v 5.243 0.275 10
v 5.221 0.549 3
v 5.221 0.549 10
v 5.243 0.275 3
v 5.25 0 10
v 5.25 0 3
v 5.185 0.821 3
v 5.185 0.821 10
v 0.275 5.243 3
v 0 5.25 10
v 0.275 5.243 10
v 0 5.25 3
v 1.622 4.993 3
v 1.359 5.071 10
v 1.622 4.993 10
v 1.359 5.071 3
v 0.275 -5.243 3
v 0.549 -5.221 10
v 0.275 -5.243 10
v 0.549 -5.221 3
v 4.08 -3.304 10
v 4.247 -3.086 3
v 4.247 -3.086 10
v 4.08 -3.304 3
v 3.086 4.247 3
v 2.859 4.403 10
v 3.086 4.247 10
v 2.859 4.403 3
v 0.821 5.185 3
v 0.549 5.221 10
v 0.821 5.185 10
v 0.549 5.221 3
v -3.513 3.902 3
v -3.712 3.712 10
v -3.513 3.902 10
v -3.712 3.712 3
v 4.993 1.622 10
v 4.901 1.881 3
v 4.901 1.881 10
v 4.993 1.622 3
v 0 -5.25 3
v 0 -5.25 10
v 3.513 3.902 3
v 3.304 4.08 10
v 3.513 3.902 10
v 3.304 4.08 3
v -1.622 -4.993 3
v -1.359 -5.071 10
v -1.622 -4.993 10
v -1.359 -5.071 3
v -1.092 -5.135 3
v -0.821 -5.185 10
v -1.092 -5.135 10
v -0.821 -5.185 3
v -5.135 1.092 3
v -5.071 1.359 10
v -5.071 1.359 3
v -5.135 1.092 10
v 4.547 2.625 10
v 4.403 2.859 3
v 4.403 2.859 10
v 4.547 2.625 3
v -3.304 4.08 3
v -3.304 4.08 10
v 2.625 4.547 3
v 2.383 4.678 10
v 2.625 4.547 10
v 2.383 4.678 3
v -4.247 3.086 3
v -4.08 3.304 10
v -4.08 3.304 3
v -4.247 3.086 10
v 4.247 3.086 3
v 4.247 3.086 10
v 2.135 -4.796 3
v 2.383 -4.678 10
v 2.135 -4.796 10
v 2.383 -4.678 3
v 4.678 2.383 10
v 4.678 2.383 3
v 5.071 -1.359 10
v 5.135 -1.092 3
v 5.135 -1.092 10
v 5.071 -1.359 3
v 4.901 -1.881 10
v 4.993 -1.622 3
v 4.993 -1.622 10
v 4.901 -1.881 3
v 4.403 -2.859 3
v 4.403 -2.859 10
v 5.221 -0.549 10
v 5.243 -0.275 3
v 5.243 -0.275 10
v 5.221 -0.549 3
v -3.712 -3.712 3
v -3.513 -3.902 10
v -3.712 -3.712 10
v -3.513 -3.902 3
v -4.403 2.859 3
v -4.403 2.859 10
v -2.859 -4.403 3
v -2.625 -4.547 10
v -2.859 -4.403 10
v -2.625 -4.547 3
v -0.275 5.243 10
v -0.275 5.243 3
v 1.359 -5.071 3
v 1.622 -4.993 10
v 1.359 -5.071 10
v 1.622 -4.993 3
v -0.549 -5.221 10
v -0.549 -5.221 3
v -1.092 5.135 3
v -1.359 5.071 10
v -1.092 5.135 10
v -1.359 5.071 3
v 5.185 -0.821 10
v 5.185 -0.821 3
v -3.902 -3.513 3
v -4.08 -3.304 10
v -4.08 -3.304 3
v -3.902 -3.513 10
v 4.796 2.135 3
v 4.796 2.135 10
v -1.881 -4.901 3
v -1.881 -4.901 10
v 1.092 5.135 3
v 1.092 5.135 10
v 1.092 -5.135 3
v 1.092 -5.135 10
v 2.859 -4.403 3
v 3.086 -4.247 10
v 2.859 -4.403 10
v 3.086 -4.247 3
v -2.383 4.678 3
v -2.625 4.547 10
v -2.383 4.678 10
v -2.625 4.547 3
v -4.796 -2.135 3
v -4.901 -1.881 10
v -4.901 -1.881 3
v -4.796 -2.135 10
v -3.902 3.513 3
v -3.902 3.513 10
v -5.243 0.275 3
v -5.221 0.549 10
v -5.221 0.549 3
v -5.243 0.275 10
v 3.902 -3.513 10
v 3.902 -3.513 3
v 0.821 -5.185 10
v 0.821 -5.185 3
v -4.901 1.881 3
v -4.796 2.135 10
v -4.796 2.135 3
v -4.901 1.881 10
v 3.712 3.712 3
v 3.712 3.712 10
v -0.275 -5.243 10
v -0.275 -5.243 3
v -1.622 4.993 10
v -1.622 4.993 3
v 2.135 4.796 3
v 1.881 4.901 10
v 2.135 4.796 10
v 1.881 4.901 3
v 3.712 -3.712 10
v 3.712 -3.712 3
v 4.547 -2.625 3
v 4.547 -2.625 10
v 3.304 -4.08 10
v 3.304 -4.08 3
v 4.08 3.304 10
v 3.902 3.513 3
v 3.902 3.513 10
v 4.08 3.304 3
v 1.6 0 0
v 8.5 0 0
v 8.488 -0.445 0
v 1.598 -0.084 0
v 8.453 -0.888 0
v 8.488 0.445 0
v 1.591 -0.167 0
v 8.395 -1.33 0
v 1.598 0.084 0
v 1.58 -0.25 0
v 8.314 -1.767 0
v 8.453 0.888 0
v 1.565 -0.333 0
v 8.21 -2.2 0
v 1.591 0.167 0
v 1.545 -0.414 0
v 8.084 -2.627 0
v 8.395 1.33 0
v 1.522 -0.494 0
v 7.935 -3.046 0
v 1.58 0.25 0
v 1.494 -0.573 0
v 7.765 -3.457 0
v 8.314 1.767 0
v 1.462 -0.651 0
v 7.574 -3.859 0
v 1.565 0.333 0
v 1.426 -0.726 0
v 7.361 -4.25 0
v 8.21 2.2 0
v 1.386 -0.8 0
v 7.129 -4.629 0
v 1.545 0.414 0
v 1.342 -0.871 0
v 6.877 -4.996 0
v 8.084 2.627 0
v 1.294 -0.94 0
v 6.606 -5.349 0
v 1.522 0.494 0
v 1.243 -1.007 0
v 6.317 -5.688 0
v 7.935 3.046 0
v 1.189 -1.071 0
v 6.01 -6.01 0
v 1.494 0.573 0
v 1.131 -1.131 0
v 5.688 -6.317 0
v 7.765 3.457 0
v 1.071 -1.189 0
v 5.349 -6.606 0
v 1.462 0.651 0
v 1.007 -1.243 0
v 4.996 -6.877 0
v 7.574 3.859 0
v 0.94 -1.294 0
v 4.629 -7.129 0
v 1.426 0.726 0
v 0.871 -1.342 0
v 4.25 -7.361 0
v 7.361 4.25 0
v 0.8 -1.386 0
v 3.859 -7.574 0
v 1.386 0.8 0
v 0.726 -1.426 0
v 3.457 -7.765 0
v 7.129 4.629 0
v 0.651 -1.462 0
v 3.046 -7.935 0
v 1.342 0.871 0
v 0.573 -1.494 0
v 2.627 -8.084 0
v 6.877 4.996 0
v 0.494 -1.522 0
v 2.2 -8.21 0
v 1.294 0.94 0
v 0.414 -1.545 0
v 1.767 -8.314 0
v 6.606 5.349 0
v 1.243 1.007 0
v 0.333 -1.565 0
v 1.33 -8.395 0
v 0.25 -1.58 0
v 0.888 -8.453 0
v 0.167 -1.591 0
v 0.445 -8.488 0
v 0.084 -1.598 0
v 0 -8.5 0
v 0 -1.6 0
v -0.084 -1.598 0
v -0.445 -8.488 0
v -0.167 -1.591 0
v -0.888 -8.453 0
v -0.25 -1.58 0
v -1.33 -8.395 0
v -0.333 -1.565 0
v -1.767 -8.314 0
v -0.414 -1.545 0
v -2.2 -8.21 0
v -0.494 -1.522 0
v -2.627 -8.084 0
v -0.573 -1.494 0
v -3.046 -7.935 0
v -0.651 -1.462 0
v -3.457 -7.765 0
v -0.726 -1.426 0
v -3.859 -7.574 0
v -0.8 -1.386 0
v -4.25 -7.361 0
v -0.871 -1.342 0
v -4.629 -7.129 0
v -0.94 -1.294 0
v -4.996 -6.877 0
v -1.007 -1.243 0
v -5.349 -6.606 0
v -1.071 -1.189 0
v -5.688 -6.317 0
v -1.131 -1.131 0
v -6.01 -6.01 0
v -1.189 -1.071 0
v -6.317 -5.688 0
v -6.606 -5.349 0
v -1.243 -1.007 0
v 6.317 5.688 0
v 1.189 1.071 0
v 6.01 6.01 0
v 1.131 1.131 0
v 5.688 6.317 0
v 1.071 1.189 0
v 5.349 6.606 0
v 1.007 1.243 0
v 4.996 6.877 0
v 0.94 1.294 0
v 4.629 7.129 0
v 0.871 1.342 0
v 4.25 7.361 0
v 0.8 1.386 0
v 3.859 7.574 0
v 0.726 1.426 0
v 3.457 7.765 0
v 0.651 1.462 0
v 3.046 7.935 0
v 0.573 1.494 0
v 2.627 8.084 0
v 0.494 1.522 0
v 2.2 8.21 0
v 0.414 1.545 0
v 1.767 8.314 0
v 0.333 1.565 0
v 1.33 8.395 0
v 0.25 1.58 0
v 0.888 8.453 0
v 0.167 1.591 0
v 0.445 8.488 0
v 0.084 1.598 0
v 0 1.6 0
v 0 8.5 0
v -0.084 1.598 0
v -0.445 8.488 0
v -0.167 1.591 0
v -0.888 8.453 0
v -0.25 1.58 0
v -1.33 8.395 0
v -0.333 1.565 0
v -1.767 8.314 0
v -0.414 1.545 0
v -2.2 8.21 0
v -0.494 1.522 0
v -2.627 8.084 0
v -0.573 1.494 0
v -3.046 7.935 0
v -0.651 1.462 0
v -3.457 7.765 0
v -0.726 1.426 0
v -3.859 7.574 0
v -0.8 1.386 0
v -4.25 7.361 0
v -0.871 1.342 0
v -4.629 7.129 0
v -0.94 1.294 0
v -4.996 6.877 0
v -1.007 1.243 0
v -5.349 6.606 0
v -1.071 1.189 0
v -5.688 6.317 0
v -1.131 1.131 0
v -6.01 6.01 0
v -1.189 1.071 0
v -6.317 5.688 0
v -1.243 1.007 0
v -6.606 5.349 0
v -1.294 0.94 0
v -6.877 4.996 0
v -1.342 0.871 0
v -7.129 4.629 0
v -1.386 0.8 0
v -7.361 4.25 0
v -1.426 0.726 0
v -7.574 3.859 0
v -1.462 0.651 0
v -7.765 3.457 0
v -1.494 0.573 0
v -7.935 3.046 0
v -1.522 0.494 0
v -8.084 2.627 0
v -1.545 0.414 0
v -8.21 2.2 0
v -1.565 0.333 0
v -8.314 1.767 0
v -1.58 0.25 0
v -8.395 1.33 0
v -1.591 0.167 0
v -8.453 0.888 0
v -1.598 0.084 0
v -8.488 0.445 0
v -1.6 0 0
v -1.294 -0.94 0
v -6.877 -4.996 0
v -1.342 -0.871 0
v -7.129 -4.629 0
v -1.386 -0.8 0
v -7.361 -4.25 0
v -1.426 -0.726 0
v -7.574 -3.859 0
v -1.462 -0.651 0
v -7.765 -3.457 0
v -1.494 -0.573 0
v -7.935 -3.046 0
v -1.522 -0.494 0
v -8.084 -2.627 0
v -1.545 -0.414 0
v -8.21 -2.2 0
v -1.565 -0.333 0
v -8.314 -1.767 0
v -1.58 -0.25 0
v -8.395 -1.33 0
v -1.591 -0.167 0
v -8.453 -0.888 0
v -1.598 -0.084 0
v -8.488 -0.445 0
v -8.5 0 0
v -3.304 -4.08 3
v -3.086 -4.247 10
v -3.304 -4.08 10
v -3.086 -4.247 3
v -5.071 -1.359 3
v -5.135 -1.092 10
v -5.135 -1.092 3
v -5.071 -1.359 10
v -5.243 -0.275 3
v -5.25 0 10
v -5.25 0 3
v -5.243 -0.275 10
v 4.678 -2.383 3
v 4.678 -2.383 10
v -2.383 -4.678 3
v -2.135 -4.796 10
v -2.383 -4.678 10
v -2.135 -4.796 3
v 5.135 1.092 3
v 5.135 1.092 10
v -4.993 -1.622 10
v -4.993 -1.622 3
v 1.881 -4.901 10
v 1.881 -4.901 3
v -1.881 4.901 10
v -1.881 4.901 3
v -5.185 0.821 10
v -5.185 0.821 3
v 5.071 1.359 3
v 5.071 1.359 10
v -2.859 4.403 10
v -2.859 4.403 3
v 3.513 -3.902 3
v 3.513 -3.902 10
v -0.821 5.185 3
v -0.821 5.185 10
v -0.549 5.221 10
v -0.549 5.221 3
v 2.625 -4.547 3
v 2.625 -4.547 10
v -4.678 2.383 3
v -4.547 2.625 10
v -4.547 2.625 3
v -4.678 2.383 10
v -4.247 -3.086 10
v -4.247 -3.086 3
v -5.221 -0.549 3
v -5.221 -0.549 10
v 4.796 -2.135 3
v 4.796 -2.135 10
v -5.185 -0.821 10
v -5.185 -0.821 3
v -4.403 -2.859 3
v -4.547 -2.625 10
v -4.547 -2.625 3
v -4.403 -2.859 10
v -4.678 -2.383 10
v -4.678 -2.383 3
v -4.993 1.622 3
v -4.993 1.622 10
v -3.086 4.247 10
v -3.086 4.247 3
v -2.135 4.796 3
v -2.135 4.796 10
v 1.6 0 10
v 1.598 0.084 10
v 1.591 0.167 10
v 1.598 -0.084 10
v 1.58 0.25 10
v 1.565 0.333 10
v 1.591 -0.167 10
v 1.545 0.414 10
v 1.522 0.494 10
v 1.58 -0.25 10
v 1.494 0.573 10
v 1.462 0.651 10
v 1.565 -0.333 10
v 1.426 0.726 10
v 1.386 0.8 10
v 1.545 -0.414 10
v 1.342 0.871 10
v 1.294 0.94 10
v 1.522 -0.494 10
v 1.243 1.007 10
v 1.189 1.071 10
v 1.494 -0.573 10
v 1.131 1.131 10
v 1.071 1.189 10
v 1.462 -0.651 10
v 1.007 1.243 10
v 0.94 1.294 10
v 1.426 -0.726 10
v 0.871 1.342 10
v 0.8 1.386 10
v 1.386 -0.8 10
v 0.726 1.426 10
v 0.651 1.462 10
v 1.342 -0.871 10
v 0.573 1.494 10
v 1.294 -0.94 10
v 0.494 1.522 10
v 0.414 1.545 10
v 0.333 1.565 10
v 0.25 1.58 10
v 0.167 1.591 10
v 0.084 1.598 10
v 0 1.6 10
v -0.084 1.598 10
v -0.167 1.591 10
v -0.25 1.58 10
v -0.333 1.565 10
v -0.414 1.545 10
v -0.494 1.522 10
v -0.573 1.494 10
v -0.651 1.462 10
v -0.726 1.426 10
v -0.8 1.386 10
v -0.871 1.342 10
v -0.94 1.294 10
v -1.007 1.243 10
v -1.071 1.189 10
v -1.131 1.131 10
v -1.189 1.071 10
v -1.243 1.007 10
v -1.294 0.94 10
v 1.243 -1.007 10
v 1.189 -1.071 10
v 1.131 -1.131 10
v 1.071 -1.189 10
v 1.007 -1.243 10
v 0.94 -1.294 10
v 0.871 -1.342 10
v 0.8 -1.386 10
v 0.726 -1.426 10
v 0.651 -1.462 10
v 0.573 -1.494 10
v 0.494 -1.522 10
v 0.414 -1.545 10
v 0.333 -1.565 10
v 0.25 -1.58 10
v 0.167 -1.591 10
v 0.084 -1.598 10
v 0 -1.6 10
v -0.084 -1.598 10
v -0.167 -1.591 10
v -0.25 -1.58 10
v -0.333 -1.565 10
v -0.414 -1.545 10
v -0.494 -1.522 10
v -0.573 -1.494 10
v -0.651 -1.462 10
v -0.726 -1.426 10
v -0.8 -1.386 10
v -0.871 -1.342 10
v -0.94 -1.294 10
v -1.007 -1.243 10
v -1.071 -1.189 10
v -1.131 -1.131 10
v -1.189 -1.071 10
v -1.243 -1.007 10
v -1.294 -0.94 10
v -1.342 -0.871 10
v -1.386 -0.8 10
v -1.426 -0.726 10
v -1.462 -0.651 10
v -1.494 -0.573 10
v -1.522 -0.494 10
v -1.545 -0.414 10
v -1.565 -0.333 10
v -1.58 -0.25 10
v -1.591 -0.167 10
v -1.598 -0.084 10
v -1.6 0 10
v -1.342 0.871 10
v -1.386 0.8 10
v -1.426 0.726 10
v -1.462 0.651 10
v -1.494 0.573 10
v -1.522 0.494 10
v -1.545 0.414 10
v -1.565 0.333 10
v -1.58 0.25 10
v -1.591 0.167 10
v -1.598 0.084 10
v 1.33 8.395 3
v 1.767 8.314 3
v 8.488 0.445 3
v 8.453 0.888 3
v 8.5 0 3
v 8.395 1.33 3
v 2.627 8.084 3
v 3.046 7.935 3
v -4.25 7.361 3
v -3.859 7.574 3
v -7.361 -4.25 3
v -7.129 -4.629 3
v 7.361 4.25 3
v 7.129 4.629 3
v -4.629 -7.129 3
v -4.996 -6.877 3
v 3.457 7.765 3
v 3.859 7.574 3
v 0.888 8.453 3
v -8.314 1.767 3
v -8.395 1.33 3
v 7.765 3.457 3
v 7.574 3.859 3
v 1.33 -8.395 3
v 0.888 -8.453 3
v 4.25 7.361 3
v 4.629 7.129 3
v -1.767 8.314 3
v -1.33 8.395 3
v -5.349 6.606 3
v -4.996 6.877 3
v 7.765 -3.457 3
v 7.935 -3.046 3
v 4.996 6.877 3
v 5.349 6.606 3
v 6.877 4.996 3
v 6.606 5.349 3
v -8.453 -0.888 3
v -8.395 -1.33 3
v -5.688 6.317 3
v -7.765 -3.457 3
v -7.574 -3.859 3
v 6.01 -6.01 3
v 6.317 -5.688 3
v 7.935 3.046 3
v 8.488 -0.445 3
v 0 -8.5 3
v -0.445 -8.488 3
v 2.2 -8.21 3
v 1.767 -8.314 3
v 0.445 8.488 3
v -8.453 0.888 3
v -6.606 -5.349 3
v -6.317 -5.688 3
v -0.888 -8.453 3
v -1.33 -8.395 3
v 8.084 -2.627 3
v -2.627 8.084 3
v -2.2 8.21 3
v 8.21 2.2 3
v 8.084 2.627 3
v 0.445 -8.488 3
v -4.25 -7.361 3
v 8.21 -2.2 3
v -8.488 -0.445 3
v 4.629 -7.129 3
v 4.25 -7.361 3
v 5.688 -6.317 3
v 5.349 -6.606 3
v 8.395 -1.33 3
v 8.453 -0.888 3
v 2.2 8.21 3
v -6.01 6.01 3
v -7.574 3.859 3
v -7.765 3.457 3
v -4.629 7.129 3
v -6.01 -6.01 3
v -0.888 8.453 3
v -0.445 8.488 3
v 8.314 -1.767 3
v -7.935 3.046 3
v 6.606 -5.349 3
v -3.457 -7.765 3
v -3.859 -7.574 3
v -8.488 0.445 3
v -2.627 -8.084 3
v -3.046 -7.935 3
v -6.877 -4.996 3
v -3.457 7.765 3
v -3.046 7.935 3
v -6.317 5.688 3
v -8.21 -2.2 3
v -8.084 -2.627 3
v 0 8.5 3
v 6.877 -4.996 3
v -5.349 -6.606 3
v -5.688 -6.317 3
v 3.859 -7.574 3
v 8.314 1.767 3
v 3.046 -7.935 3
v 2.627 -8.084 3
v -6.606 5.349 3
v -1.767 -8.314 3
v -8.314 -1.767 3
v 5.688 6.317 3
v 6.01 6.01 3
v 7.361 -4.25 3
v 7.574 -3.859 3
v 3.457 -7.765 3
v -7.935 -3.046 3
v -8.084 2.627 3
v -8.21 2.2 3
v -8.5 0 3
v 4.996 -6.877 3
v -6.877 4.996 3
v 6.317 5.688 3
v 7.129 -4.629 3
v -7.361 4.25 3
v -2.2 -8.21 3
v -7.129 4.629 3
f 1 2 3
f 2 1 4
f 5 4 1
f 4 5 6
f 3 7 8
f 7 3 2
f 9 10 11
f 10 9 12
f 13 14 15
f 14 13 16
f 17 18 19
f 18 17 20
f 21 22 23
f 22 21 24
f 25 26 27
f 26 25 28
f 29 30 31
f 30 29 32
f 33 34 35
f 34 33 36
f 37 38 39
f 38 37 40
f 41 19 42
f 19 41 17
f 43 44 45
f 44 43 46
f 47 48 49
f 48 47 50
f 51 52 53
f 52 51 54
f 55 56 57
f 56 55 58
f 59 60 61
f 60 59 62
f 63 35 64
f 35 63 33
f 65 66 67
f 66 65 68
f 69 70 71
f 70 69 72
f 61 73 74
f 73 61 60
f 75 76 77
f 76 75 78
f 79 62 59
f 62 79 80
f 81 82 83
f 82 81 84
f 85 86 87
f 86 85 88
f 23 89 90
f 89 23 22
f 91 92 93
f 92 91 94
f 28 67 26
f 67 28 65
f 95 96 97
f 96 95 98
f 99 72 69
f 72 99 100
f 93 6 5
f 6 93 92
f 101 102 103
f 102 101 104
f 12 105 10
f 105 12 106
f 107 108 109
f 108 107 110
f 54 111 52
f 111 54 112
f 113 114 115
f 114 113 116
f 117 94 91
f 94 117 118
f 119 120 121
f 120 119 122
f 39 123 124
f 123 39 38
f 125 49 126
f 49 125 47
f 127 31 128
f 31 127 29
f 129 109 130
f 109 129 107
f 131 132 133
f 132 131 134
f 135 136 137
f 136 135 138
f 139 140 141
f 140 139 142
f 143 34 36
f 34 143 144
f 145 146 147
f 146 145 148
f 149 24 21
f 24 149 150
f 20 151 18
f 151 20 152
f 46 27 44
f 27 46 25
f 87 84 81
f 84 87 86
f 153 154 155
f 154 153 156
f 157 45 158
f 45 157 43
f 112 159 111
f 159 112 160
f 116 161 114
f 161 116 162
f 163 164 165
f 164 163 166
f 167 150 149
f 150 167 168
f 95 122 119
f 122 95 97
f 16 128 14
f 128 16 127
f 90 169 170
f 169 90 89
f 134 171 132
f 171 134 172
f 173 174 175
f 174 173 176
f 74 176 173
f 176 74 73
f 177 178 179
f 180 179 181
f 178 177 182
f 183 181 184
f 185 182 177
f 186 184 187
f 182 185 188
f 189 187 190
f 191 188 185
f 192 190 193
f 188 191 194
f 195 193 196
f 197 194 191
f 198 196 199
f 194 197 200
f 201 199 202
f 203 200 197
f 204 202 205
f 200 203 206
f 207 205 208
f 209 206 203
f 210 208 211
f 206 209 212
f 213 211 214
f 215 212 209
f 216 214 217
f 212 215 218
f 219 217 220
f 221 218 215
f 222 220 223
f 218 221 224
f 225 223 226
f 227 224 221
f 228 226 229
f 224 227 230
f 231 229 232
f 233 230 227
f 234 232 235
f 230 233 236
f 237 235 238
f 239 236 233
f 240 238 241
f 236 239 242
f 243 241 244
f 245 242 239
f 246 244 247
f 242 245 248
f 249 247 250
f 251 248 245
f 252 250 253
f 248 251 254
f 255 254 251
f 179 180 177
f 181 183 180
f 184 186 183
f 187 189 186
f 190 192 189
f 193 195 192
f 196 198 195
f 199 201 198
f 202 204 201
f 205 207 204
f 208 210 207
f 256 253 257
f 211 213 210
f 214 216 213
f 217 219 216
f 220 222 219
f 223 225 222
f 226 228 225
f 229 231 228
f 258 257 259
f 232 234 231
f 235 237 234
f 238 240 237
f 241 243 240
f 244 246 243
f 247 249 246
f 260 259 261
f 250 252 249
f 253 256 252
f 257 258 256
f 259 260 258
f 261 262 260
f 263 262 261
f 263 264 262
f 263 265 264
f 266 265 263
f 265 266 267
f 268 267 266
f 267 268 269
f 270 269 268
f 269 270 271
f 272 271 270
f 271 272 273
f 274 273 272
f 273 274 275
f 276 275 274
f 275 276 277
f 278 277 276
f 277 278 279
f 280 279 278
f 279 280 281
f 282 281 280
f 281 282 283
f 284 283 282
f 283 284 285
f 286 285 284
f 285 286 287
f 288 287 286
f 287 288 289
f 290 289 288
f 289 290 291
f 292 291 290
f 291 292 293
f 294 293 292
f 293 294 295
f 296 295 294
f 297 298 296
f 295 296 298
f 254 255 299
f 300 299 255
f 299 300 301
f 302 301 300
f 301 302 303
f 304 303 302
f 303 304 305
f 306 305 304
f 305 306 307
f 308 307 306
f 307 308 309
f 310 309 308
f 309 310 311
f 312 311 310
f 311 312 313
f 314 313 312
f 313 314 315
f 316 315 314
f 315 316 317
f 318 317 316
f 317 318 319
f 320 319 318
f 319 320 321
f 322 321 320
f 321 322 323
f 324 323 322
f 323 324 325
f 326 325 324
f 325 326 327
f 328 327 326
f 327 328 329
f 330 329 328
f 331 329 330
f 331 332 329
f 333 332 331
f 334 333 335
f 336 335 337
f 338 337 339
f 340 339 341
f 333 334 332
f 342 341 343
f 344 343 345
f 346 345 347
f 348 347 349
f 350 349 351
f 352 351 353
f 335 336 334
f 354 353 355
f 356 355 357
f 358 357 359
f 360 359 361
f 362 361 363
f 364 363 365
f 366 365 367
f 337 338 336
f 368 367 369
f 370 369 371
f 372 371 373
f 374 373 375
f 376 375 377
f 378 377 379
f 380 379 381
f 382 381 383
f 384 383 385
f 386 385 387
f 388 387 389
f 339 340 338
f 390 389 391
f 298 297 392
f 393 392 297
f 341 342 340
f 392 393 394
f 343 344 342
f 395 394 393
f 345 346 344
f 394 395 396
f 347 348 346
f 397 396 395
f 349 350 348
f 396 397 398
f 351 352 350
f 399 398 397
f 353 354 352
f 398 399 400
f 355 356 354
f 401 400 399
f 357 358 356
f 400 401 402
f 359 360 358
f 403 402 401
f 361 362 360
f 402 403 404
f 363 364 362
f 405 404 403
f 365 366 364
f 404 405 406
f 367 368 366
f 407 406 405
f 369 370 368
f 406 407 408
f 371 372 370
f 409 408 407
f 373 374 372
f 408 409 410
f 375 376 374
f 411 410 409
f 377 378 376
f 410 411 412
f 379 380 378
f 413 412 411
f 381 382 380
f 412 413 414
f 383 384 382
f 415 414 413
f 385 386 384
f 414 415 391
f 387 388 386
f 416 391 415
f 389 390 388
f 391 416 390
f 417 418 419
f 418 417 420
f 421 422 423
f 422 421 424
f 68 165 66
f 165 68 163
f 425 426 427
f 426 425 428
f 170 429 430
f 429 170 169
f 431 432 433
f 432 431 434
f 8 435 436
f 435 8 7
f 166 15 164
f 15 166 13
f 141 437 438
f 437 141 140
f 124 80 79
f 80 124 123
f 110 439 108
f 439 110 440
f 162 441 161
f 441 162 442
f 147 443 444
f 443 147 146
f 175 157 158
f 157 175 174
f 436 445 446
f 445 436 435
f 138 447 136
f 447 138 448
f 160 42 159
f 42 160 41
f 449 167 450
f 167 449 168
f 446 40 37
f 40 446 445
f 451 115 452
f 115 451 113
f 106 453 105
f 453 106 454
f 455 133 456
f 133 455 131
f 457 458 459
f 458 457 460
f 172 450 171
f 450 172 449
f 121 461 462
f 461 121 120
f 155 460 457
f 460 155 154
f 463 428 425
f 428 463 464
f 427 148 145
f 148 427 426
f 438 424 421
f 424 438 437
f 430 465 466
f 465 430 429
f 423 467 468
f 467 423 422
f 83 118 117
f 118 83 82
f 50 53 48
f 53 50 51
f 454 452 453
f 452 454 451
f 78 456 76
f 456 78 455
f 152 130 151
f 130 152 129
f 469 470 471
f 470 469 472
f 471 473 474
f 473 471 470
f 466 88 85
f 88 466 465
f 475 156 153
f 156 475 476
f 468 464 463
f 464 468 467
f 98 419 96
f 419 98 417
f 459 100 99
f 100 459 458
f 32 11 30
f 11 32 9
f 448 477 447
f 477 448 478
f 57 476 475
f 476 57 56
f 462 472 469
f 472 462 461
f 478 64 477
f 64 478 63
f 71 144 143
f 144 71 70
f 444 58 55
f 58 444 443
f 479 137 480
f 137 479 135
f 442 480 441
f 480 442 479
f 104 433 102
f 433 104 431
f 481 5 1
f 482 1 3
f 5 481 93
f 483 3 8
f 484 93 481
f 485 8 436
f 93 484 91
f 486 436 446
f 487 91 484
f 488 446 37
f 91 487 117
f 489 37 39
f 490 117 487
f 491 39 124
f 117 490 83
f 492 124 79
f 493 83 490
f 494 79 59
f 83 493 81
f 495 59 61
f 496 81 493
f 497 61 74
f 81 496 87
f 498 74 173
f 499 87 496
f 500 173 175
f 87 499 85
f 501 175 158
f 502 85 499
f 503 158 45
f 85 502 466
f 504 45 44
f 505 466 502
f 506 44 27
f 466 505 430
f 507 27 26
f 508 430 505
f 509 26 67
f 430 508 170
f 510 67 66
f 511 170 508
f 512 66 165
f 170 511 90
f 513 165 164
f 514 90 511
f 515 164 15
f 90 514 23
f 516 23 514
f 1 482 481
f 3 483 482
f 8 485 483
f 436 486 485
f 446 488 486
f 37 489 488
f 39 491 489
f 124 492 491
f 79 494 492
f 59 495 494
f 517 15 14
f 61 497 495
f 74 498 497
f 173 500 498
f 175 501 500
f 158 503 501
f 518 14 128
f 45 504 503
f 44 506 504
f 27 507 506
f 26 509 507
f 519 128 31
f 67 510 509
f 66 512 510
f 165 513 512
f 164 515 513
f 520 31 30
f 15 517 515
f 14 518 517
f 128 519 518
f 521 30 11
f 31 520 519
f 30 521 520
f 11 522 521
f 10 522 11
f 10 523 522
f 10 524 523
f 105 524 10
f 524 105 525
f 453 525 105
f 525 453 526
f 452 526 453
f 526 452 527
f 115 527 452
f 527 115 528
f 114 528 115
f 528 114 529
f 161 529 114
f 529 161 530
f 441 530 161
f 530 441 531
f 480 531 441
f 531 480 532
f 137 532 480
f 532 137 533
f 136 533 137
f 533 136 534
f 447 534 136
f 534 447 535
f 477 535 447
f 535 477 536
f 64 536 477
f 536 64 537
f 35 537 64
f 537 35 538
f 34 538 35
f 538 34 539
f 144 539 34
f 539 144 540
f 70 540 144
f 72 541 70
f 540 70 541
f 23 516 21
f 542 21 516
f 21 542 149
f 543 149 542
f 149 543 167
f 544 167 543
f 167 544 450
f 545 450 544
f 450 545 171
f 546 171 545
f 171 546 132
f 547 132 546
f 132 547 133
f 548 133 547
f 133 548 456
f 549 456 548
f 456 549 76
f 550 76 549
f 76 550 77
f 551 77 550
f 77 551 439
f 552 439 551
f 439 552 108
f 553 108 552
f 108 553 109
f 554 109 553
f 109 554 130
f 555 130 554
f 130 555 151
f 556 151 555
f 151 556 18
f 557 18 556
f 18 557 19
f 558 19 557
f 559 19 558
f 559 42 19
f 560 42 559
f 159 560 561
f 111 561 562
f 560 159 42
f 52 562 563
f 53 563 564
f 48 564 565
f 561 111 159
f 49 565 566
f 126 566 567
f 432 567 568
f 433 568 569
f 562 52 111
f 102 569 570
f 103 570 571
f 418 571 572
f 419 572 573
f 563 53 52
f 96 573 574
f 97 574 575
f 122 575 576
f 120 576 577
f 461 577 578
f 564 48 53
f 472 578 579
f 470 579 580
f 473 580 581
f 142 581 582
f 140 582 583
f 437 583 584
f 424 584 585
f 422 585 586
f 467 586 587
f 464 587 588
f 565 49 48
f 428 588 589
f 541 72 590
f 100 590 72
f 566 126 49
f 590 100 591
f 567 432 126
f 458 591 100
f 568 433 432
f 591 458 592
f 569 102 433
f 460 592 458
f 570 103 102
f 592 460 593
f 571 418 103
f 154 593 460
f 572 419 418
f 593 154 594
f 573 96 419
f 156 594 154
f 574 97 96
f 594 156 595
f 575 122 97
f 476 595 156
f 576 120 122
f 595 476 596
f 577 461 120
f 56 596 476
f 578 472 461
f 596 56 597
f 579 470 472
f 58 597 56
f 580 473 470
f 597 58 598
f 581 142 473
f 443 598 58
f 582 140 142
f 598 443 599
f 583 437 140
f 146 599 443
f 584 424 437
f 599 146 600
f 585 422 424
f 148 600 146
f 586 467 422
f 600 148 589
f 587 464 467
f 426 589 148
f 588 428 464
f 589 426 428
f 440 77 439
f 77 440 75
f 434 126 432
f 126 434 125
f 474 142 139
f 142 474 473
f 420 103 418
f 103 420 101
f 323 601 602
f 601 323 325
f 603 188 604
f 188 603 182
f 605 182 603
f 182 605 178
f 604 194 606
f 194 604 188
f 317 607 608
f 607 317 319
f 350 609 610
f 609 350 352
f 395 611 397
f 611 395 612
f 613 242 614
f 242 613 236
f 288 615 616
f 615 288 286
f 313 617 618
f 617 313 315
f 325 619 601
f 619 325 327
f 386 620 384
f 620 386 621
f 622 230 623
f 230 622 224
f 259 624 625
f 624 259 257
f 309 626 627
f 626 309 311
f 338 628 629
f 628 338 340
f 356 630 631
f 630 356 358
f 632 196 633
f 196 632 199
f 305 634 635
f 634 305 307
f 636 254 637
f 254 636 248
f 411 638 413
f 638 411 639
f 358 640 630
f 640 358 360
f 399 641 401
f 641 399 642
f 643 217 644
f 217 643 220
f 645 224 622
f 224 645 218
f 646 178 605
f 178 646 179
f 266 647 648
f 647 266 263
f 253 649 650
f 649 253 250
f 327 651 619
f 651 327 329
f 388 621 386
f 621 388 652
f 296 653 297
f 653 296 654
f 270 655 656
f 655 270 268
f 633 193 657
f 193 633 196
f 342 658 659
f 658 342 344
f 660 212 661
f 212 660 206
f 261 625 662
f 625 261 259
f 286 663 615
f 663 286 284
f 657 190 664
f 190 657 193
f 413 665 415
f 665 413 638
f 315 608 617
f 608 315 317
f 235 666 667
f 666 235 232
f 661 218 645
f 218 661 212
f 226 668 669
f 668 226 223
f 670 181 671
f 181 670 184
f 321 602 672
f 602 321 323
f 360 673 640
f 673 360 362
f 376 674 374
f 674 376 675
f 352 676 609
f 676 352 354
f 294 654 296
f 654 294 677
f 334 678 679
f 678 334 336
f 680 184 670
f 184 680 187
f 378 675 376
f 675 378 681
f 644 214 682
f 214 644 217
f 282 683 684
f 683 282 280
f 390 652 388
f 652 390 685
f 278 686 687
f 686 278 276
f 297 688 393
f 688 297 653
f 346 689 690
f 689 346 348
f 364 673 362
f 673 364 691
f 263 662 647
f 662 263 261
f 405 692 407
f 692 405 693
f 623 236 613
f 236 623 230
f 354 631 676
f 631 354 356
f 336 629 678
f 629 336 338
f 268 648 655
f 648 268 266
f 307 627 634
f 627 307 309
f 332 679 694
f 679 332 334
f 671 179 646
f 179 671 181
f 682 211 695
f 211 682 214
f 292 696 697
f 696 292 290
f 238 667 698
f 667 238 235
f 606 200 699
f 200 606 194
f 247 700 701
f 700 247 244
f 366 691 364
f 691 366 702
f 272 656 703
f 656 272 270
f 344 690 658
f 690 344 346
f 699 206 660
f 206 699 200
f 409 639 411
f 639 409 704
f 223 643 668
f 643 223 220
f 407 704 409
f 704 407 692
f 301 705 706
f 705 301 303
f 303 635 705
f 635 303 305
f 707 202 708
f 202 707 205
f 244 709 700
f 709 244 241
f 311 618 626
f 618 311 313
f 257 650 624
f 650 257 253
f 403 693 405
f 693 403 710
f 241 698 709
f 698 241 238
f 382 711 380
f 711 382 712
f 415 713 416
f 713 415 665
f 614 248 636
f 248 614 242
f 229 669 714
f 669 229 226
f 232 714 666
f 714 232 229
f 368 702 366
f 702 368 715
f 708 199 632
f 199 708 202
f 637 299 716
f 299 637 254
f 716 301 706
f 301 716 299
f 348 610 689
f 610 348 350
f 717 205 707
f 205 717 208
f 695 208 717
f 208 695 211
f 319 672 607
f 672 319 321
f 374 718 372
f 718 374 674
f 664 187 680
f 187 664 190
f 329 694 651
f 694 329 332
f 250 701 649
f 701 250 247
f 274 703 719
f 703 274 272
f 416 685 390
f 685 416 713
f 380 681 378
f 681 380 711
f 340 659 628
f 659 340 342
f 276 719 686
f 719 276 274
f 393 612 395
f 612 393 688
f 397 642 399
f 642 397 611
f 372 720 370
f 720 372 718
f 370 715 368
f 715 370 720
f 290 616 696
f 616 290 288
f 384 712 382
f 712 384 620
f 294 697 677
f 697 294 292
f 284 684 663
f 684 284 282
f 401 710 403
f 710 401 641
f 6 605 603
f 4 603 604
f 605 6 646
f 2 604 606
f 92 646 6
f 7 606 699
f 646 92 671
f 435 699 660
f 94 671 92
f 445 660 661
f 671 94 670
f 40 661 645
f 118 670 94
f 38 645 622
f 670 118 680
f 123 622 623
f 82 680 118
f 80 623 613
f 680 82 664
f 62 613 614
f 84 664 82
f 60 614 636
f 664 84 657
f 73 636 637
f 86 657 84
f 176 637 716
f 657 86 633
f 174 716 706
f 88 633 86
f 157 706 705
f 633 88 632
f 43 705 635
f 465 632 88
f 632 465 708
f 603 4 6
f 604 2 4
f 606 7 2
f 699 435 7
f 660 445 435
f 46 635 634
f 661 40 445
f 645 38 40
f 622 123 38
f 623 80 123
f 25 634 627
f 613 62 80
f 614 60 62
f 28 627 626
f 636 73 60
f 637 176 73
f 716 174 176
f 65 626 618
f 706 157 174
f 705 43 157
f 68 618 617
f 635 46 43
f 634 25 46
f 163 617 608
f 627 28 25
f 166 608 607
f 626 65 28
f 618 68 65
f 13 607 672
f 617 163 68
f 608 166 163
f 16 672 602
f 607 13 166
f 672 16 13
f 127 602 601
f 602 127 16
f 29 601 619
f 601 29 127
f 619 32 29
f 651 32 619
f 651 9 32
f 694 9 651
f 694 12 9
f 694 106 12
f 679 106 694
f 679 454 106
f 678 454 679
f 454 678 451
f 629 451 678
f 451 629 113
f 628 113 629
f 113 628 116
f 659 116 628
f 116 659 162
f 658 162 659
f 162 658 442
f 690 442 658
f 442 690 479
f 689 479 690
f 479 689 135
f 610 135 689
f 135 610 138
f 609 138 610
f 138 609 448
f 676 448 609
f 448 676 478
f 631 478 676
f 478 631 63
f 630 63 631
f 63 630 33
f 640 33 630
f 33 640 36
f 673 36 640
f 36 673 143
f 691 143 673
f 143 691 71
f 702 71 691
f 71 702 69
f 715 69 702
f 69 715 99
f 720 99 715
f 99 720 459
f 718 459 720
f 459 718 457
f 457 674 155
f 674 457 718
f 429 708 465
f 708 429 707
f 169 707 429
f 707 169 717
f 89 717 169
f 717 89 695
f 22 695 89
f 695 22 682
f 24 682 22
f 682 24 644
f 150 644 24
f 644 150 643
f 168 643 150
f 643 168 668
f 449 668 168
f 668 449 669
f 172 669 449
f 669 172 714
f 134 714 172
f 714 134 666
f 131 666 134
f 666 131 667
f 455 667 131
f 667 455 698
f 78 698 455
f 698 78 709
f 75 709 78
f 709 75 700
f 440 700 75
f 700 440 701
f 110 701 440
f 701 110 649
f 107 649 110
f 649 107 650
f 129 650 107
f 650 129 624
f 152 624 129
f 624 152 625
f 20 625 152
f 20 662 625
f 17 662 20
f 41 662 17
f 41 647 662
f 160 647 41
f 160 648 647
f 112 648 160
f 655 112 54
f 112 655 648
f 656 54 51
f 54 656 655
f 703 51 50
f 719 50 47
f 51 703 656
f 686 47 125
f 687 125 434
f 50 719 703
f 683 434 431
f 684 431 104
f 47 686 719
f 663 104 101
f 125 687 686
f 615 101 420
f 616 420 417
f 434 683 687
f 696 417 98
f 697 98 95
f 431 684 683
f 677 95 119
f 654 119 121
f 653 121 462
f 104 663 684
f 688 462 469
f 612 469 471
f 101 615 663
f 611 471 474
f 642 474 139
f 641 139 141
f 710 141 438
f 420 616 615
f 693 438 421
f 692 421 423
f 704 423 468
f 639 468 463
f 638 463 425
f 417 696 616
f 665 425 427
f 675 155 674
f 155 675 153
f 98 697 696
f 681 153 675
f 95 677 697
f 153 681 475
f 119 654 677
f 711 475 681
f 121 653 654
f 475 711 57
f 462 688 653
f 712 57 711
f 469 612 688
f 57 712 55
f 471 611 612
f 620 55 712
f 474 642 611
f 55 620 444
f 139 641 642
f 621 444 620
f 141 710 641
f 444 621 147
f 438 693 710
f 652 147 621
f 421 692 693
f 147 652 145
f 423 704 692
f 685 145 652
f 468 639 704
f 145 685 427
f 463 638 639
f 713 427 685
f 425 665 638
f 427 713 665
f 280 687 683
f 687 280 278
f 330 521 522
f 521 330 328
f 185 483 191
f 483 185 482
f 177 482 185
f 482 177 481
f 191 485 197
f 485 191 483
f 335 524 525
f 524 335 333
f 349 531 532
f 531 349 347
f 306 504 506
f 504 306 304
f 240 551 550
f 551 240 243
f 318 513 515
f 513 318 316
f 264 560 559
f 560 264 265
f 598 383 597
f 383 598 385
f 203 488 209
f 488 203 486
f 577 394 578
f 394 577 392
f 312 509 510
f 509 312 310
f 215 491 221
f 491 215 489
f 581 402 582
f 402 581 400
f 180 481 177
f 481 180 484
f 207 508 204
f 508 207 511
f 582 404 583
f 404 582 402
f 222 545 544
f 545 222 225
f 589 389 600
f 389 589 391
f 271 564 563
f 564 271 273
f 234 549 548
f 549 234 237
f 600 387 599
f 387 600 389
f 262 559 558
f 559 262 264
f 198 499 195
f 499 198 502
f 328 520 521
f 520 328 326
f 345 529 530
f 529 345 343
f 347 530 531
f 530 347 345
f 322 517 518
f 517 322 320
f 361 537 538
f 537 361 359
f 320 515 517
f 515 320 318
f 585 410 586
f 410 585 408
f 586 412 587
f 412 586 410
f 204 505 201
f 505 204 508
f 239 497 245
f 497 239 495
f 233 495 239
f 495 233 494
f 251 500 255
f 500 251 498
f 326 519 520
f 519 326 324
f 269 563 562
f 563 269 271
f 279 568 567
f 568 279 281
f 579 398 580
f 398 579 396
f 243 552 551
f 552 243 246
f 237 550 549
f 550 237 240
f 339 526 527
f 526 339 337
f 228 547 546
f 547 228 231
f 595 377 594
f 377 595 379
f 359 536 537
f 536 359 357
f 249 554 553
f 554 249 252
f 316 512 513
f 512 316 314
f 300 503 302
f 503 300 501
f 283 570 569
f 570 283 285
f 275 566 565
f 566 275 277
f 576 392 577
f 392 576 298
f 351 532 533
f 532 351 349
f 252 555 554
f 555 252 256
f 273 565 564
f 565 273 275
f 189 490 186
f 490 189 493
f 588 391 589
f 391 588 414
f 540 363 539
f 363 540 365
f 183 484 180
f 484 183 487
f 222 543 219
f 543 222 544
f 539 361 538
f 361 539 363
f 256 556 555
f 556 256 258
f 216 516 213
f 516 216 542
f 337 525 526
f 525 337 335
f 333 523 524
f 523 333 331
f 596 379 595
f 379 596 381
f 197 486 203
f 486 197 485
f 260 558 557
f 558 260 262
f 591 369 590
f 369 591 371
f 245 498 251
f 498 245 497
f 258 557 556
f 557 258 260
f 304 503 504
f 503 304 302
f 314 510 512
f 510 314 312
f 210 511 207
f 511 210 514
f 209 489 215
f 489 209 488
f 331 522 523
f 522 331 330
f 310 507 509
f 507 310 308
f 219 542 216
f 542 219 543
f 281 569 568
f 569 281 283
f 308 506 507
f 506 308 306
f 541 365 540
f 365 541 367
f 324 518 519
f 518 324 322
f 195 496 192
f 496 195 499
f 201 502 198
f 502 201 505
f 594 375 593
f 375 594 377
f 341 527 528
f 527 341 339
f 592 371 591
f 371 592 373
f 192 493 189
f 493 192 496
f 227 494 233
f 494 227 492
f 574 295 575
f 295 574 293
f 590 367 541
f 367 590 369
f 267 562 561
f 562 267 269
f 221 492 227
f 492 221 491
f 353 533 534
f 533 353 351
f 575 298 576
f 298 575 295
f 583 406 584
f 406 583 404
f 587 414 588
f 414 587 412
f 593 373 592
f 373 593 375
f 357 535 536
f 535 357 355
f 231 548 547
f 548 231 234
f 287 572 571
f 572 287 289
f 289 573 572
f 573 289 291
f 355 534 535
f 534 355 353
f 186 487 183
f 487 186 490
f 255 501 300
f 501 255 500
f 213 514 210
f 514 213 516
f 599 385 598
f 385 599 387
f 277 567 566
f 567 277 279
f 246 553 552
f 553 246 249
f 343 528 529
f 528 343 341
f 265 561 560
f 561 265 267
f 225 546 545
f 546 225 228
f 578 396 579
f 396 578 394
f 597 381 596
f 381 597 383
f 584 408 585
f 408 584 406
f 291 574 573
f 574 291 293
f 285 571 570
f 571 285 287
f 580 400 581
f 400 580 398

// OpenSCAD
H = 10.0;
$fn = 120;

difference() {
    union() {
        cylinder(h=H, d=10.5);
        cylinder(h=3, d=17.0);
    }
    cylinder(h=20, d=3.2);
}
